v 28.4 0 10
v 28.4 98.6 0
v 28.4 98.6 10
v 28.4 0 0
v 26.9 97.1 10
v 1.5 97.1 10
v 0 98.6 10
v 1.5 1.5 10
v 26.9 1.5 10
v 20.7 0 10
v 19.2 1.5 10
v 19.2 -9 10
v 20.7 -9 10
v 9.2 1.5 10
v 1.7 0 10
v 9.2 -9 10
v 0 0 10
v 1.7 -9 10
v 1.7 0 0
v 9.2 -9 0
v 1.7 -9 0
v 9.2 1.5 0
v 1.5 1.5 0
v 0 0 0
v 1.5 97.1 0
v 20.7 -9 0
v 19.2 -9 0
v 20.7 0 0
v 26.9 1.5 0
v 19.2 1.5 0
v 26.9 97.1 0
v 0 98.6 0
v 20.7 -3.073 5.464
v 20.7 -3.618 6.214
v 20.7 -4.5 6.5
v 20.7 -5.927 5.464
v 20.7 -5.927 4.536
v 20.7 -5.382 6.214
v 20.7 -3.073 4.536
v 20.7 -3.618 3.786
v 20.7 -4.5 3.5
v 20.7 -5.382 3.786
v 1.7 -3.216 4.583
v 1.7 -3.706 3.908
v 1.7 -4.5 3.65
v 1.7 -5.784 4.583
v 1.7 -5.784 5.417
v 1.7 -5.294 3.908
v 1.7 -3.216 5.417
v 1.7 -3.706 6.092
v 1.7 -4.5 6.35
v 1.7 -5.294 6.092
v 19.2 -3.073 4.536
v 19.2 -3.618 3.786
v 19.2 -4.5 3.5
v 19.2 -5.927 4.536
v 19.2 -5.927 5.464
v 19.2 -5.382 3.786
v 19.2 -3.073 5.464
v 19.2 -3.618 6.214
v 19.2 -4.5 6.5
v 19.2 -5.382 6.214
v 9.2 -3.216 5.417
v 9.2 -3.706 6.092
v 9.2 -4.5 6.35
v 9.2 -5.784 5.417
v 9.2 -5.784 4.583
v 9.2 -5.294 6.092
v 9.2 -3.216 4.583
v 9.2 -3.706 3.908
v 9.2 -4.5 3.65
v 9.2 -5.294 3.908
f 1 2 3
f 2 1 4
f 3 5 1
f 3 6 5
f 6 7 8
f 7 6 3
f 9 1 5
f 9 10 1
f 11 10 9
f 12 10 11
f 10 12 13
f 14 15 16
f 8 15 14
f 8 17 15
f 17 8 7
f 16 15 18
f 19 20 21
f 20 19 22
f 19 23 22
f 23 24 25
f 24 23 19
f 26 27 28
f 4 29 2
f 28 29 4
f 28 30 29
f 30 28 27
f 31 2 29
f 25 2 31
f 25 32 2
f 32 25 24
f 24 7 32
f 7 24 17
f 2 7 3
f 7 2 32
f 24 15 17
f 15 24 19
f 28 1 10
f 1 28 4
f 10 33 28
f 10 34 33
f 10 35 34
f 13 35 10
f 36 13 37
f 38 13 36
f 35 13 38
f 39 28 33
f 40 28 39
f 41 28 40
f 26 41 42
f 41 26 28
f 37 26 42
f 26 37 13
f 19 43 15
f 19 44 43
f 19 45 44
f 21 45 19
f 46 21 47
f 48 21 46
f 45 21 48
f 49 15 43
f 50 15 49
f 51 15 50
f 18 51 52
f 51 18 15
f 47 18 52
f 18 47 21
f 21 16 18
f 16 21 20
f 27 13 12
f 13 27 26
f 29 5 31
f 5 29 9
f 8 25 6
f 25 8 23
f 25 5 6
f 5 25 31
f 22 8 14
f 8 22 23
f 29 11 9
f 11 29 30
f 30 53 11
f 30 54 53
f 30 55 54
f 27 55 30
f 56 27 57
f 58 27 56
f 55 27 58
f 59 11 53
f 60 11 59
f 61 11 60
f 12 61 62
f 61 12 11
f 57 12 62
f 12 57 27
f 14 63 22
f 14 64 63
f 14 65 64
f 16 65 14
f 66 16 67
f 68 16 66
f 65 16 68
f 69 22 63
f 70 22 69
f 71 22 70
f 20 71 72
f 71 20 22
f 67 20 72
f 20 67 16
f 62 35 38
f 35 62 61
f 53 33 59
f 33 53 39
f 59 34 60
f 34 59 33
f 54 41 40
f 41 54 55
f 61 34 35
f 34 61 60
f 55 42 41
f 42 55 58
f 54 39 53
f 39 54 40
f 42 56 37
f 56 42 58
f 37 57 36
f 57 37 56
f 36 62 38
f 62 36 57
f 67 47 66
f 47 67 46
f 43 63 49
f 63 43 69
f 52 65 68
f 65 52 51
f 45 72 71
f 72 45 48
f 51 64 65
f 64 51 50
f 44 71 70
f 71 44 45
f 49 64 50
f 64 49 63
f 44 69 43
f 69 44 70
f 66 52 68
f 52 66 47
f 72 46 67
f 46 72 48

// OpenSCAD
h = 10;
w = 25.4;
d = 95.6;
t = 1.5;

o = (w - 10)/2;
ot = 3*t;
op = 2*t;
r_outer = 3/2;
r_inner = 2.7/2;

r = r_outer;

difference(){
    union(){
        cube([w + 2*t, d + 2*t, h]);
        translate([o + 2*(t-ot), -2*(op + r), 0])
        cube([w - 2*(o - ot), 2*(op+r), h]);
        //translate([o - t, -2*t, 0])
        //cube([w - 2*(o - 2*t), t, h]);
    }
    translate([t, t, 0])
    cube([w, d, h]);
    translate([t + o, -2*(op+r), 0])
    cube([w - 2*o, 3*(op+r), h]);
    
    translate([w/2, -r-op, h/2])
    rotate([0, 90, 0])
    cylinder(1000, r, r, $fn=10);

    translate([w/2, -r-op, h/2])
    rotate([0, -90, 0])
    cylinder(1000, r_inner, r_inner, $fn=10);
}
